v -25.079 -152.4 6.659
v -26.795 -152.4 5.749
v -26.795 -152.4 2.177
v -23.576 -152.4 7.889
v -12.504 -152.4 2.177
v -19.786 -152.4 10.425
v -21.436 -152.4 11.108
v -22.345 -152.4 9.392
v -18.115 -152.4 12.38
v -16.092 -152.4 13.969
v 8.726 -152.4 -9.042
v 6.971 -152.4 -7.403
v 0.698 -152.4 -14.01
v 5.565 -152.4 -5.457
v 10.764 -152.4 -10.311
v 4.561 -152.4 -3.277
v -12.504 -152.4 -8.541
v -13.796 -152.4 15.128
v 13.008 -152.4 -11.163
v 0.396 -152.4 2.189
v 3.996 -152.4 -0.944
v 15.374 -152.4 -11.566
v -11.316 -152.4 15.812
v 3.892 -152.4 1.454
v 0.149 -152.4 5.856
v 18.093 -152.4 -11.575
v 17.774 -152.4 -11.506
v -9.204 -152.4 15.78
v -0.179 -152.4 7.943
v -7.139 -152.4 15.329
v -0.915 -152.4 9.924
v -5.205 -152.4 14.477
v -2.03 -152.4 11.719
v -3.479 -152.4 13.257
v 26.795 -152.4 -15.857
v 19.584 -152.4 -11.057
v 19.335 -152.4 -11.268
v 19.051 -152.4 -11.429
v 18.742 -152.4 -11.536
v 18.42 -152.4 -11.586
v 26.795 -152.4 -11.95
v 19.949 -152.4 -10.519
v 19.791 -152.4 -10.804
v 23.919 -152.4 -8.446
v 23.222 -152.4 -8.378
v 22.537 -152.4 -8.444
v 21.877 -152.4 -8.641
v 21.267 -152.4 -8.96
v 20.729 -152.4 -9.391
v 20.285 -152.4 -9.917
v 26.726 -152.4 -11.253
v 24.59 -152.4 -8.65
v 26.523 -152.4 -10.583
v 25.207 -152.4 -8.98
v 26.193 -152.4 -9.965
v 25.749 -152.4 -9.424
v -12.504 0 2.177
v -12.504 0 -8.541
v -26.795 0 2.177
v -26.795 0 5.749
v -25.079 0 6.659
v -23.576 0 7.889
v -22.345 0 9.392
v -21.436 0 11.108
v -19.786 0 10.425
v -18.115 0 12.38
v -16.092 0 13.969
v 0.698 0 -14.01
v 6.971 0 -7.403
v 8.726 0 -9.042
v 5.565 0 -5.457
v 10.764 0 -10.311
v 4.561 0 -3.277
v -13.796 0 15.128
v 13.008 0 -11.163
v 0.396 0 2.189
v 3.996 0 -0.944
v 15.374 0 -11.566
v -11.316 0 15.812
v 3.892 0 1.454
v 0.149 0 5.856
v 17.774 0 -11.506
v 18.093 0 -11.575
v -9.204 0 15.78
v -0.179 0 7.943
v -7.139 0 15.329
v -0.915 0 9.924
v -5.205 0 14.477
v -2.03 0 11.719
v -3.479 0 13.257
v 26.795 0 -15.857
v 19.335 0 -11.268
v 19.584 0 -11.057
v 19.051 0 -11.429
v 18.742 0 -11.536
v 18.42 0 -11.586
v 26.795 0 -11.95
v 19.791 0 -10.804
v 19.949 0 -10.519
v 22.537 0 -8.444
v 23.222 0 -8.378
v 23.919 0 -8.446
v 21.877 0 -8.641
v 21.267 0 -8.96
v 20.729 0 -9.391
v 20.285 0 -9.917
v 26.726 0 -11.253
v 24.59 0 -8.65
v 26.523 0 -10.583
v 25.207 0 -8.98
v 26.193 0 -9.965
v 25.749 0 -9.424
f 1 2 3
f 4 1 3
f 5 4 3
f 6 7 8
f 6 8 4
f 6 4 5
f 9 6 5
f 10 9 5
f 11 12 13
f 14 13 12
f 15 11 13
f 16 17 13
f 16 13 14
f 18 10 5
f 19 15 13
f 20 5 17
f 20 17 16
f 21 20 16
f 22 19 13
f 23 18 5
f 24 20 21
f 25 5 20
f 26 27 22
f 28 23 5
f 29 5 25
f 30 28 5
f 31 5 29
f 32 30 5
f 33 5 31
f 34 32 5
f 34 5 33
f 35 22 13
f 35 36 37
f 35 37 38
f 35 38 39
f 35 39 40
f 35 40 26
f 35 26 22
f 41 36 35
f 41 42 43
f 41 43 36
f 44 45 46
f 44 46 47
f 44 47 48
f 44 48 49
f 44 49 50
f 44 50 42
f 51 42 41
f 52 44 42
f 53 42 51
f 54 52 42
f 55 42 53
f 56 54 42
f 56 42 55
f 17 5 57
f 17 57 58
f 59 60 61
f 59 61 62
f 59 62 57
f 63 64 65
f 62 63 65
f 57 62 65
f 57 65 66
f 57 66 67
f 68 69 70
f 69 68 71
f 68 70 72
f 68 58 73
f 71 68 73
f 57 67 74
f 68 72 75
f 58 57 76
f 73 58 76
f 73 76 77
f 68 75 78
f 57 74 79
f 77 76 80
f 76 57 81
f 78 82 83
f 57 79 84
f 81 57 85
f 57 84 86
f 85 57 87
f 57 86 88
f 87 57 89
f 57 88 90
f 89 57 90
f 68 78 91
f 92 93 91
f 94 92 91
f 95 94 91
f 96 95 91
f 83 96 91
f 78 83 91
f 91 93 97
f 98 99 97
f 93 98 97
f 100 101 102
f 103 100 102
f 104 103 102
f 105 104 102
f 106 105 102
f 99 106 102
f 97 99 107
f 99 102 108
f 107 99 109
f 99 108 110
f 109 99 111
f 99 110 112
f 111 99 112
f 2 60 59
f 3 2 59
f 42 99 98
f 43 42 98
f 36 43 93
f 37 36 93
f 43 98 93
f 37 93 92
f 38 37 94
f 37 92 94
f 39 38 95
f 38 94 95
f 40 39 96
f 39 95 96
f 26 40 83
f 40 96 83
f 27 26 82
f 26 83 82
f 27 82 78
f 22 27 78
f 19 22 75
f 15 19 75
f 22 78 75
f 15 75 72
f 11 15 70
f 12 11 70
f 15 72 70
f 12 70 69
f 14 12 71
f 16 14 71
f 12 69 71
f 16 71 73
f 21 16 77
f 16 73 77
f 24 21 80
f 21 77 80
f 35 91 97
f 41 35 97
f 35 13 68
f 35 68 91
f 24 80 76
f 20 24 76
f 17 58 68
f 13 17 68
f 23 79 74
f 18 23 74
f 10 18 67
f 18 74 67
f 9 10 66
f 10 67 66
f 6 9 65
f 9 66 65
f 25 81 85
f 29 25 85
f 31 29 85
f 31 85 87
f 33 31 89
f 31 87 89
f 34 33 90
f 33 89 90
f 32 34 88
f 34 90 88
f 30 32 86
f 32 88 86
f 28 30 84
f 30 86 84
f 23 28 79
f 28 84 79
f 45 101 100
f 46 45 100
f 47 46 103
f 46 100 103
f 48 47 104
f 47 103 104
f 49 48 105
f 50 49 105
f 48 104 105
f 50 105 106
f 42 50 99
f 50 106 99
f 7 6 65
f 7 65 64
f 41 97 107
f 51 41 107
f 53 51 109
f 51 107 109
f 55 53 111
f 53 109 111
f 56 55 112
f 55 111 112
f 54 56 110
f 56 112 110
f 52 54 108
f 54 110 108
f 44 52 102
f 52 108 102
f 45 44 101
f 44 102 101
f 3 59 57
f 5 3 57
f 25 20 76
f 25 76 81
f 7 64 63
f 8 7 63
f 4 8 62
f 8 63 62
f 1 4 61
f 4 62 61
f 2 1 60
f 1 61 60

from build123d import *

# Parameters (mm, degrees)
F1_DEPTH = 152.4


# Not quite as in the source:
# - ends of sketch curves that miss each other by under 0.0002 mm in the source are joined


with BuildPart() as f1:
    # F0 (on Front) → F1 (new body)
    with BuildSketch(Plane.XZ):
        with BuildLine():
            ThreePointArc((-21.436008248, 11.1083378523), (-23.575890093, 7.8892124872), (-26.7950133579, 5.7493274827))
            Line((-26.7950133579, 5.7493274827), (-26.7950188, 2.1766784))
            Line((-26.7950188, 2.1766784), (-12.5043438, 2.1766784))
            Line((-12.5043438, 2.1766784), (-12.5043438, -8.5413342))
            Line((-12.5043438, -8.5413342), (0.6985, -14.010132))
            Line((0.6985, -14.010132), (26.7949934, -15.8565596))
            Line((26.7949934, -15.8565596), (26.7949934, -11.9503444))
            ThreePointArc((26.7949934, -11.9503444), (25.7485848099, -9.4240905901), (23.222331, -8.377682))
            ThreePointArc((23.222331, -8.377682), (21.2667719884, -8.9604103578), (19.949146016, -10.5185005939))
            ThreePointArc((19.949146016, -10.5185005939), (19.0509354729, -11.4291461184), (17.7741589903, -11.5058412669))
            ThreePointArc((17.7741589903, -11.5058412669), (7.8088470745, -8.265032818), (3.892042, 1.4544802))
            Line((3.892042, 1.4544802), (0.3963321215, 2.1892390214))
            Line((0.3963321215, 2.1892390214), (0.1486383408, 5.85559709))
            ThreePointArc((0.1486383408, 5.85559709), (-3.4794590188, 13.2572174827), (-11.3164912909, 15.8122126013))
            ThreePointArc((-11.3164912909, 15.8122126013), (-16.0919447869, 13.968734586), (-19.7856463188, 10.4247345468))
            Line((-19.7856463188, 10.4247345468), (-21.436008248, 11.1083378523))
        make_face()
    extrude(amount=F1_DEPTH)


solid = f1.part
